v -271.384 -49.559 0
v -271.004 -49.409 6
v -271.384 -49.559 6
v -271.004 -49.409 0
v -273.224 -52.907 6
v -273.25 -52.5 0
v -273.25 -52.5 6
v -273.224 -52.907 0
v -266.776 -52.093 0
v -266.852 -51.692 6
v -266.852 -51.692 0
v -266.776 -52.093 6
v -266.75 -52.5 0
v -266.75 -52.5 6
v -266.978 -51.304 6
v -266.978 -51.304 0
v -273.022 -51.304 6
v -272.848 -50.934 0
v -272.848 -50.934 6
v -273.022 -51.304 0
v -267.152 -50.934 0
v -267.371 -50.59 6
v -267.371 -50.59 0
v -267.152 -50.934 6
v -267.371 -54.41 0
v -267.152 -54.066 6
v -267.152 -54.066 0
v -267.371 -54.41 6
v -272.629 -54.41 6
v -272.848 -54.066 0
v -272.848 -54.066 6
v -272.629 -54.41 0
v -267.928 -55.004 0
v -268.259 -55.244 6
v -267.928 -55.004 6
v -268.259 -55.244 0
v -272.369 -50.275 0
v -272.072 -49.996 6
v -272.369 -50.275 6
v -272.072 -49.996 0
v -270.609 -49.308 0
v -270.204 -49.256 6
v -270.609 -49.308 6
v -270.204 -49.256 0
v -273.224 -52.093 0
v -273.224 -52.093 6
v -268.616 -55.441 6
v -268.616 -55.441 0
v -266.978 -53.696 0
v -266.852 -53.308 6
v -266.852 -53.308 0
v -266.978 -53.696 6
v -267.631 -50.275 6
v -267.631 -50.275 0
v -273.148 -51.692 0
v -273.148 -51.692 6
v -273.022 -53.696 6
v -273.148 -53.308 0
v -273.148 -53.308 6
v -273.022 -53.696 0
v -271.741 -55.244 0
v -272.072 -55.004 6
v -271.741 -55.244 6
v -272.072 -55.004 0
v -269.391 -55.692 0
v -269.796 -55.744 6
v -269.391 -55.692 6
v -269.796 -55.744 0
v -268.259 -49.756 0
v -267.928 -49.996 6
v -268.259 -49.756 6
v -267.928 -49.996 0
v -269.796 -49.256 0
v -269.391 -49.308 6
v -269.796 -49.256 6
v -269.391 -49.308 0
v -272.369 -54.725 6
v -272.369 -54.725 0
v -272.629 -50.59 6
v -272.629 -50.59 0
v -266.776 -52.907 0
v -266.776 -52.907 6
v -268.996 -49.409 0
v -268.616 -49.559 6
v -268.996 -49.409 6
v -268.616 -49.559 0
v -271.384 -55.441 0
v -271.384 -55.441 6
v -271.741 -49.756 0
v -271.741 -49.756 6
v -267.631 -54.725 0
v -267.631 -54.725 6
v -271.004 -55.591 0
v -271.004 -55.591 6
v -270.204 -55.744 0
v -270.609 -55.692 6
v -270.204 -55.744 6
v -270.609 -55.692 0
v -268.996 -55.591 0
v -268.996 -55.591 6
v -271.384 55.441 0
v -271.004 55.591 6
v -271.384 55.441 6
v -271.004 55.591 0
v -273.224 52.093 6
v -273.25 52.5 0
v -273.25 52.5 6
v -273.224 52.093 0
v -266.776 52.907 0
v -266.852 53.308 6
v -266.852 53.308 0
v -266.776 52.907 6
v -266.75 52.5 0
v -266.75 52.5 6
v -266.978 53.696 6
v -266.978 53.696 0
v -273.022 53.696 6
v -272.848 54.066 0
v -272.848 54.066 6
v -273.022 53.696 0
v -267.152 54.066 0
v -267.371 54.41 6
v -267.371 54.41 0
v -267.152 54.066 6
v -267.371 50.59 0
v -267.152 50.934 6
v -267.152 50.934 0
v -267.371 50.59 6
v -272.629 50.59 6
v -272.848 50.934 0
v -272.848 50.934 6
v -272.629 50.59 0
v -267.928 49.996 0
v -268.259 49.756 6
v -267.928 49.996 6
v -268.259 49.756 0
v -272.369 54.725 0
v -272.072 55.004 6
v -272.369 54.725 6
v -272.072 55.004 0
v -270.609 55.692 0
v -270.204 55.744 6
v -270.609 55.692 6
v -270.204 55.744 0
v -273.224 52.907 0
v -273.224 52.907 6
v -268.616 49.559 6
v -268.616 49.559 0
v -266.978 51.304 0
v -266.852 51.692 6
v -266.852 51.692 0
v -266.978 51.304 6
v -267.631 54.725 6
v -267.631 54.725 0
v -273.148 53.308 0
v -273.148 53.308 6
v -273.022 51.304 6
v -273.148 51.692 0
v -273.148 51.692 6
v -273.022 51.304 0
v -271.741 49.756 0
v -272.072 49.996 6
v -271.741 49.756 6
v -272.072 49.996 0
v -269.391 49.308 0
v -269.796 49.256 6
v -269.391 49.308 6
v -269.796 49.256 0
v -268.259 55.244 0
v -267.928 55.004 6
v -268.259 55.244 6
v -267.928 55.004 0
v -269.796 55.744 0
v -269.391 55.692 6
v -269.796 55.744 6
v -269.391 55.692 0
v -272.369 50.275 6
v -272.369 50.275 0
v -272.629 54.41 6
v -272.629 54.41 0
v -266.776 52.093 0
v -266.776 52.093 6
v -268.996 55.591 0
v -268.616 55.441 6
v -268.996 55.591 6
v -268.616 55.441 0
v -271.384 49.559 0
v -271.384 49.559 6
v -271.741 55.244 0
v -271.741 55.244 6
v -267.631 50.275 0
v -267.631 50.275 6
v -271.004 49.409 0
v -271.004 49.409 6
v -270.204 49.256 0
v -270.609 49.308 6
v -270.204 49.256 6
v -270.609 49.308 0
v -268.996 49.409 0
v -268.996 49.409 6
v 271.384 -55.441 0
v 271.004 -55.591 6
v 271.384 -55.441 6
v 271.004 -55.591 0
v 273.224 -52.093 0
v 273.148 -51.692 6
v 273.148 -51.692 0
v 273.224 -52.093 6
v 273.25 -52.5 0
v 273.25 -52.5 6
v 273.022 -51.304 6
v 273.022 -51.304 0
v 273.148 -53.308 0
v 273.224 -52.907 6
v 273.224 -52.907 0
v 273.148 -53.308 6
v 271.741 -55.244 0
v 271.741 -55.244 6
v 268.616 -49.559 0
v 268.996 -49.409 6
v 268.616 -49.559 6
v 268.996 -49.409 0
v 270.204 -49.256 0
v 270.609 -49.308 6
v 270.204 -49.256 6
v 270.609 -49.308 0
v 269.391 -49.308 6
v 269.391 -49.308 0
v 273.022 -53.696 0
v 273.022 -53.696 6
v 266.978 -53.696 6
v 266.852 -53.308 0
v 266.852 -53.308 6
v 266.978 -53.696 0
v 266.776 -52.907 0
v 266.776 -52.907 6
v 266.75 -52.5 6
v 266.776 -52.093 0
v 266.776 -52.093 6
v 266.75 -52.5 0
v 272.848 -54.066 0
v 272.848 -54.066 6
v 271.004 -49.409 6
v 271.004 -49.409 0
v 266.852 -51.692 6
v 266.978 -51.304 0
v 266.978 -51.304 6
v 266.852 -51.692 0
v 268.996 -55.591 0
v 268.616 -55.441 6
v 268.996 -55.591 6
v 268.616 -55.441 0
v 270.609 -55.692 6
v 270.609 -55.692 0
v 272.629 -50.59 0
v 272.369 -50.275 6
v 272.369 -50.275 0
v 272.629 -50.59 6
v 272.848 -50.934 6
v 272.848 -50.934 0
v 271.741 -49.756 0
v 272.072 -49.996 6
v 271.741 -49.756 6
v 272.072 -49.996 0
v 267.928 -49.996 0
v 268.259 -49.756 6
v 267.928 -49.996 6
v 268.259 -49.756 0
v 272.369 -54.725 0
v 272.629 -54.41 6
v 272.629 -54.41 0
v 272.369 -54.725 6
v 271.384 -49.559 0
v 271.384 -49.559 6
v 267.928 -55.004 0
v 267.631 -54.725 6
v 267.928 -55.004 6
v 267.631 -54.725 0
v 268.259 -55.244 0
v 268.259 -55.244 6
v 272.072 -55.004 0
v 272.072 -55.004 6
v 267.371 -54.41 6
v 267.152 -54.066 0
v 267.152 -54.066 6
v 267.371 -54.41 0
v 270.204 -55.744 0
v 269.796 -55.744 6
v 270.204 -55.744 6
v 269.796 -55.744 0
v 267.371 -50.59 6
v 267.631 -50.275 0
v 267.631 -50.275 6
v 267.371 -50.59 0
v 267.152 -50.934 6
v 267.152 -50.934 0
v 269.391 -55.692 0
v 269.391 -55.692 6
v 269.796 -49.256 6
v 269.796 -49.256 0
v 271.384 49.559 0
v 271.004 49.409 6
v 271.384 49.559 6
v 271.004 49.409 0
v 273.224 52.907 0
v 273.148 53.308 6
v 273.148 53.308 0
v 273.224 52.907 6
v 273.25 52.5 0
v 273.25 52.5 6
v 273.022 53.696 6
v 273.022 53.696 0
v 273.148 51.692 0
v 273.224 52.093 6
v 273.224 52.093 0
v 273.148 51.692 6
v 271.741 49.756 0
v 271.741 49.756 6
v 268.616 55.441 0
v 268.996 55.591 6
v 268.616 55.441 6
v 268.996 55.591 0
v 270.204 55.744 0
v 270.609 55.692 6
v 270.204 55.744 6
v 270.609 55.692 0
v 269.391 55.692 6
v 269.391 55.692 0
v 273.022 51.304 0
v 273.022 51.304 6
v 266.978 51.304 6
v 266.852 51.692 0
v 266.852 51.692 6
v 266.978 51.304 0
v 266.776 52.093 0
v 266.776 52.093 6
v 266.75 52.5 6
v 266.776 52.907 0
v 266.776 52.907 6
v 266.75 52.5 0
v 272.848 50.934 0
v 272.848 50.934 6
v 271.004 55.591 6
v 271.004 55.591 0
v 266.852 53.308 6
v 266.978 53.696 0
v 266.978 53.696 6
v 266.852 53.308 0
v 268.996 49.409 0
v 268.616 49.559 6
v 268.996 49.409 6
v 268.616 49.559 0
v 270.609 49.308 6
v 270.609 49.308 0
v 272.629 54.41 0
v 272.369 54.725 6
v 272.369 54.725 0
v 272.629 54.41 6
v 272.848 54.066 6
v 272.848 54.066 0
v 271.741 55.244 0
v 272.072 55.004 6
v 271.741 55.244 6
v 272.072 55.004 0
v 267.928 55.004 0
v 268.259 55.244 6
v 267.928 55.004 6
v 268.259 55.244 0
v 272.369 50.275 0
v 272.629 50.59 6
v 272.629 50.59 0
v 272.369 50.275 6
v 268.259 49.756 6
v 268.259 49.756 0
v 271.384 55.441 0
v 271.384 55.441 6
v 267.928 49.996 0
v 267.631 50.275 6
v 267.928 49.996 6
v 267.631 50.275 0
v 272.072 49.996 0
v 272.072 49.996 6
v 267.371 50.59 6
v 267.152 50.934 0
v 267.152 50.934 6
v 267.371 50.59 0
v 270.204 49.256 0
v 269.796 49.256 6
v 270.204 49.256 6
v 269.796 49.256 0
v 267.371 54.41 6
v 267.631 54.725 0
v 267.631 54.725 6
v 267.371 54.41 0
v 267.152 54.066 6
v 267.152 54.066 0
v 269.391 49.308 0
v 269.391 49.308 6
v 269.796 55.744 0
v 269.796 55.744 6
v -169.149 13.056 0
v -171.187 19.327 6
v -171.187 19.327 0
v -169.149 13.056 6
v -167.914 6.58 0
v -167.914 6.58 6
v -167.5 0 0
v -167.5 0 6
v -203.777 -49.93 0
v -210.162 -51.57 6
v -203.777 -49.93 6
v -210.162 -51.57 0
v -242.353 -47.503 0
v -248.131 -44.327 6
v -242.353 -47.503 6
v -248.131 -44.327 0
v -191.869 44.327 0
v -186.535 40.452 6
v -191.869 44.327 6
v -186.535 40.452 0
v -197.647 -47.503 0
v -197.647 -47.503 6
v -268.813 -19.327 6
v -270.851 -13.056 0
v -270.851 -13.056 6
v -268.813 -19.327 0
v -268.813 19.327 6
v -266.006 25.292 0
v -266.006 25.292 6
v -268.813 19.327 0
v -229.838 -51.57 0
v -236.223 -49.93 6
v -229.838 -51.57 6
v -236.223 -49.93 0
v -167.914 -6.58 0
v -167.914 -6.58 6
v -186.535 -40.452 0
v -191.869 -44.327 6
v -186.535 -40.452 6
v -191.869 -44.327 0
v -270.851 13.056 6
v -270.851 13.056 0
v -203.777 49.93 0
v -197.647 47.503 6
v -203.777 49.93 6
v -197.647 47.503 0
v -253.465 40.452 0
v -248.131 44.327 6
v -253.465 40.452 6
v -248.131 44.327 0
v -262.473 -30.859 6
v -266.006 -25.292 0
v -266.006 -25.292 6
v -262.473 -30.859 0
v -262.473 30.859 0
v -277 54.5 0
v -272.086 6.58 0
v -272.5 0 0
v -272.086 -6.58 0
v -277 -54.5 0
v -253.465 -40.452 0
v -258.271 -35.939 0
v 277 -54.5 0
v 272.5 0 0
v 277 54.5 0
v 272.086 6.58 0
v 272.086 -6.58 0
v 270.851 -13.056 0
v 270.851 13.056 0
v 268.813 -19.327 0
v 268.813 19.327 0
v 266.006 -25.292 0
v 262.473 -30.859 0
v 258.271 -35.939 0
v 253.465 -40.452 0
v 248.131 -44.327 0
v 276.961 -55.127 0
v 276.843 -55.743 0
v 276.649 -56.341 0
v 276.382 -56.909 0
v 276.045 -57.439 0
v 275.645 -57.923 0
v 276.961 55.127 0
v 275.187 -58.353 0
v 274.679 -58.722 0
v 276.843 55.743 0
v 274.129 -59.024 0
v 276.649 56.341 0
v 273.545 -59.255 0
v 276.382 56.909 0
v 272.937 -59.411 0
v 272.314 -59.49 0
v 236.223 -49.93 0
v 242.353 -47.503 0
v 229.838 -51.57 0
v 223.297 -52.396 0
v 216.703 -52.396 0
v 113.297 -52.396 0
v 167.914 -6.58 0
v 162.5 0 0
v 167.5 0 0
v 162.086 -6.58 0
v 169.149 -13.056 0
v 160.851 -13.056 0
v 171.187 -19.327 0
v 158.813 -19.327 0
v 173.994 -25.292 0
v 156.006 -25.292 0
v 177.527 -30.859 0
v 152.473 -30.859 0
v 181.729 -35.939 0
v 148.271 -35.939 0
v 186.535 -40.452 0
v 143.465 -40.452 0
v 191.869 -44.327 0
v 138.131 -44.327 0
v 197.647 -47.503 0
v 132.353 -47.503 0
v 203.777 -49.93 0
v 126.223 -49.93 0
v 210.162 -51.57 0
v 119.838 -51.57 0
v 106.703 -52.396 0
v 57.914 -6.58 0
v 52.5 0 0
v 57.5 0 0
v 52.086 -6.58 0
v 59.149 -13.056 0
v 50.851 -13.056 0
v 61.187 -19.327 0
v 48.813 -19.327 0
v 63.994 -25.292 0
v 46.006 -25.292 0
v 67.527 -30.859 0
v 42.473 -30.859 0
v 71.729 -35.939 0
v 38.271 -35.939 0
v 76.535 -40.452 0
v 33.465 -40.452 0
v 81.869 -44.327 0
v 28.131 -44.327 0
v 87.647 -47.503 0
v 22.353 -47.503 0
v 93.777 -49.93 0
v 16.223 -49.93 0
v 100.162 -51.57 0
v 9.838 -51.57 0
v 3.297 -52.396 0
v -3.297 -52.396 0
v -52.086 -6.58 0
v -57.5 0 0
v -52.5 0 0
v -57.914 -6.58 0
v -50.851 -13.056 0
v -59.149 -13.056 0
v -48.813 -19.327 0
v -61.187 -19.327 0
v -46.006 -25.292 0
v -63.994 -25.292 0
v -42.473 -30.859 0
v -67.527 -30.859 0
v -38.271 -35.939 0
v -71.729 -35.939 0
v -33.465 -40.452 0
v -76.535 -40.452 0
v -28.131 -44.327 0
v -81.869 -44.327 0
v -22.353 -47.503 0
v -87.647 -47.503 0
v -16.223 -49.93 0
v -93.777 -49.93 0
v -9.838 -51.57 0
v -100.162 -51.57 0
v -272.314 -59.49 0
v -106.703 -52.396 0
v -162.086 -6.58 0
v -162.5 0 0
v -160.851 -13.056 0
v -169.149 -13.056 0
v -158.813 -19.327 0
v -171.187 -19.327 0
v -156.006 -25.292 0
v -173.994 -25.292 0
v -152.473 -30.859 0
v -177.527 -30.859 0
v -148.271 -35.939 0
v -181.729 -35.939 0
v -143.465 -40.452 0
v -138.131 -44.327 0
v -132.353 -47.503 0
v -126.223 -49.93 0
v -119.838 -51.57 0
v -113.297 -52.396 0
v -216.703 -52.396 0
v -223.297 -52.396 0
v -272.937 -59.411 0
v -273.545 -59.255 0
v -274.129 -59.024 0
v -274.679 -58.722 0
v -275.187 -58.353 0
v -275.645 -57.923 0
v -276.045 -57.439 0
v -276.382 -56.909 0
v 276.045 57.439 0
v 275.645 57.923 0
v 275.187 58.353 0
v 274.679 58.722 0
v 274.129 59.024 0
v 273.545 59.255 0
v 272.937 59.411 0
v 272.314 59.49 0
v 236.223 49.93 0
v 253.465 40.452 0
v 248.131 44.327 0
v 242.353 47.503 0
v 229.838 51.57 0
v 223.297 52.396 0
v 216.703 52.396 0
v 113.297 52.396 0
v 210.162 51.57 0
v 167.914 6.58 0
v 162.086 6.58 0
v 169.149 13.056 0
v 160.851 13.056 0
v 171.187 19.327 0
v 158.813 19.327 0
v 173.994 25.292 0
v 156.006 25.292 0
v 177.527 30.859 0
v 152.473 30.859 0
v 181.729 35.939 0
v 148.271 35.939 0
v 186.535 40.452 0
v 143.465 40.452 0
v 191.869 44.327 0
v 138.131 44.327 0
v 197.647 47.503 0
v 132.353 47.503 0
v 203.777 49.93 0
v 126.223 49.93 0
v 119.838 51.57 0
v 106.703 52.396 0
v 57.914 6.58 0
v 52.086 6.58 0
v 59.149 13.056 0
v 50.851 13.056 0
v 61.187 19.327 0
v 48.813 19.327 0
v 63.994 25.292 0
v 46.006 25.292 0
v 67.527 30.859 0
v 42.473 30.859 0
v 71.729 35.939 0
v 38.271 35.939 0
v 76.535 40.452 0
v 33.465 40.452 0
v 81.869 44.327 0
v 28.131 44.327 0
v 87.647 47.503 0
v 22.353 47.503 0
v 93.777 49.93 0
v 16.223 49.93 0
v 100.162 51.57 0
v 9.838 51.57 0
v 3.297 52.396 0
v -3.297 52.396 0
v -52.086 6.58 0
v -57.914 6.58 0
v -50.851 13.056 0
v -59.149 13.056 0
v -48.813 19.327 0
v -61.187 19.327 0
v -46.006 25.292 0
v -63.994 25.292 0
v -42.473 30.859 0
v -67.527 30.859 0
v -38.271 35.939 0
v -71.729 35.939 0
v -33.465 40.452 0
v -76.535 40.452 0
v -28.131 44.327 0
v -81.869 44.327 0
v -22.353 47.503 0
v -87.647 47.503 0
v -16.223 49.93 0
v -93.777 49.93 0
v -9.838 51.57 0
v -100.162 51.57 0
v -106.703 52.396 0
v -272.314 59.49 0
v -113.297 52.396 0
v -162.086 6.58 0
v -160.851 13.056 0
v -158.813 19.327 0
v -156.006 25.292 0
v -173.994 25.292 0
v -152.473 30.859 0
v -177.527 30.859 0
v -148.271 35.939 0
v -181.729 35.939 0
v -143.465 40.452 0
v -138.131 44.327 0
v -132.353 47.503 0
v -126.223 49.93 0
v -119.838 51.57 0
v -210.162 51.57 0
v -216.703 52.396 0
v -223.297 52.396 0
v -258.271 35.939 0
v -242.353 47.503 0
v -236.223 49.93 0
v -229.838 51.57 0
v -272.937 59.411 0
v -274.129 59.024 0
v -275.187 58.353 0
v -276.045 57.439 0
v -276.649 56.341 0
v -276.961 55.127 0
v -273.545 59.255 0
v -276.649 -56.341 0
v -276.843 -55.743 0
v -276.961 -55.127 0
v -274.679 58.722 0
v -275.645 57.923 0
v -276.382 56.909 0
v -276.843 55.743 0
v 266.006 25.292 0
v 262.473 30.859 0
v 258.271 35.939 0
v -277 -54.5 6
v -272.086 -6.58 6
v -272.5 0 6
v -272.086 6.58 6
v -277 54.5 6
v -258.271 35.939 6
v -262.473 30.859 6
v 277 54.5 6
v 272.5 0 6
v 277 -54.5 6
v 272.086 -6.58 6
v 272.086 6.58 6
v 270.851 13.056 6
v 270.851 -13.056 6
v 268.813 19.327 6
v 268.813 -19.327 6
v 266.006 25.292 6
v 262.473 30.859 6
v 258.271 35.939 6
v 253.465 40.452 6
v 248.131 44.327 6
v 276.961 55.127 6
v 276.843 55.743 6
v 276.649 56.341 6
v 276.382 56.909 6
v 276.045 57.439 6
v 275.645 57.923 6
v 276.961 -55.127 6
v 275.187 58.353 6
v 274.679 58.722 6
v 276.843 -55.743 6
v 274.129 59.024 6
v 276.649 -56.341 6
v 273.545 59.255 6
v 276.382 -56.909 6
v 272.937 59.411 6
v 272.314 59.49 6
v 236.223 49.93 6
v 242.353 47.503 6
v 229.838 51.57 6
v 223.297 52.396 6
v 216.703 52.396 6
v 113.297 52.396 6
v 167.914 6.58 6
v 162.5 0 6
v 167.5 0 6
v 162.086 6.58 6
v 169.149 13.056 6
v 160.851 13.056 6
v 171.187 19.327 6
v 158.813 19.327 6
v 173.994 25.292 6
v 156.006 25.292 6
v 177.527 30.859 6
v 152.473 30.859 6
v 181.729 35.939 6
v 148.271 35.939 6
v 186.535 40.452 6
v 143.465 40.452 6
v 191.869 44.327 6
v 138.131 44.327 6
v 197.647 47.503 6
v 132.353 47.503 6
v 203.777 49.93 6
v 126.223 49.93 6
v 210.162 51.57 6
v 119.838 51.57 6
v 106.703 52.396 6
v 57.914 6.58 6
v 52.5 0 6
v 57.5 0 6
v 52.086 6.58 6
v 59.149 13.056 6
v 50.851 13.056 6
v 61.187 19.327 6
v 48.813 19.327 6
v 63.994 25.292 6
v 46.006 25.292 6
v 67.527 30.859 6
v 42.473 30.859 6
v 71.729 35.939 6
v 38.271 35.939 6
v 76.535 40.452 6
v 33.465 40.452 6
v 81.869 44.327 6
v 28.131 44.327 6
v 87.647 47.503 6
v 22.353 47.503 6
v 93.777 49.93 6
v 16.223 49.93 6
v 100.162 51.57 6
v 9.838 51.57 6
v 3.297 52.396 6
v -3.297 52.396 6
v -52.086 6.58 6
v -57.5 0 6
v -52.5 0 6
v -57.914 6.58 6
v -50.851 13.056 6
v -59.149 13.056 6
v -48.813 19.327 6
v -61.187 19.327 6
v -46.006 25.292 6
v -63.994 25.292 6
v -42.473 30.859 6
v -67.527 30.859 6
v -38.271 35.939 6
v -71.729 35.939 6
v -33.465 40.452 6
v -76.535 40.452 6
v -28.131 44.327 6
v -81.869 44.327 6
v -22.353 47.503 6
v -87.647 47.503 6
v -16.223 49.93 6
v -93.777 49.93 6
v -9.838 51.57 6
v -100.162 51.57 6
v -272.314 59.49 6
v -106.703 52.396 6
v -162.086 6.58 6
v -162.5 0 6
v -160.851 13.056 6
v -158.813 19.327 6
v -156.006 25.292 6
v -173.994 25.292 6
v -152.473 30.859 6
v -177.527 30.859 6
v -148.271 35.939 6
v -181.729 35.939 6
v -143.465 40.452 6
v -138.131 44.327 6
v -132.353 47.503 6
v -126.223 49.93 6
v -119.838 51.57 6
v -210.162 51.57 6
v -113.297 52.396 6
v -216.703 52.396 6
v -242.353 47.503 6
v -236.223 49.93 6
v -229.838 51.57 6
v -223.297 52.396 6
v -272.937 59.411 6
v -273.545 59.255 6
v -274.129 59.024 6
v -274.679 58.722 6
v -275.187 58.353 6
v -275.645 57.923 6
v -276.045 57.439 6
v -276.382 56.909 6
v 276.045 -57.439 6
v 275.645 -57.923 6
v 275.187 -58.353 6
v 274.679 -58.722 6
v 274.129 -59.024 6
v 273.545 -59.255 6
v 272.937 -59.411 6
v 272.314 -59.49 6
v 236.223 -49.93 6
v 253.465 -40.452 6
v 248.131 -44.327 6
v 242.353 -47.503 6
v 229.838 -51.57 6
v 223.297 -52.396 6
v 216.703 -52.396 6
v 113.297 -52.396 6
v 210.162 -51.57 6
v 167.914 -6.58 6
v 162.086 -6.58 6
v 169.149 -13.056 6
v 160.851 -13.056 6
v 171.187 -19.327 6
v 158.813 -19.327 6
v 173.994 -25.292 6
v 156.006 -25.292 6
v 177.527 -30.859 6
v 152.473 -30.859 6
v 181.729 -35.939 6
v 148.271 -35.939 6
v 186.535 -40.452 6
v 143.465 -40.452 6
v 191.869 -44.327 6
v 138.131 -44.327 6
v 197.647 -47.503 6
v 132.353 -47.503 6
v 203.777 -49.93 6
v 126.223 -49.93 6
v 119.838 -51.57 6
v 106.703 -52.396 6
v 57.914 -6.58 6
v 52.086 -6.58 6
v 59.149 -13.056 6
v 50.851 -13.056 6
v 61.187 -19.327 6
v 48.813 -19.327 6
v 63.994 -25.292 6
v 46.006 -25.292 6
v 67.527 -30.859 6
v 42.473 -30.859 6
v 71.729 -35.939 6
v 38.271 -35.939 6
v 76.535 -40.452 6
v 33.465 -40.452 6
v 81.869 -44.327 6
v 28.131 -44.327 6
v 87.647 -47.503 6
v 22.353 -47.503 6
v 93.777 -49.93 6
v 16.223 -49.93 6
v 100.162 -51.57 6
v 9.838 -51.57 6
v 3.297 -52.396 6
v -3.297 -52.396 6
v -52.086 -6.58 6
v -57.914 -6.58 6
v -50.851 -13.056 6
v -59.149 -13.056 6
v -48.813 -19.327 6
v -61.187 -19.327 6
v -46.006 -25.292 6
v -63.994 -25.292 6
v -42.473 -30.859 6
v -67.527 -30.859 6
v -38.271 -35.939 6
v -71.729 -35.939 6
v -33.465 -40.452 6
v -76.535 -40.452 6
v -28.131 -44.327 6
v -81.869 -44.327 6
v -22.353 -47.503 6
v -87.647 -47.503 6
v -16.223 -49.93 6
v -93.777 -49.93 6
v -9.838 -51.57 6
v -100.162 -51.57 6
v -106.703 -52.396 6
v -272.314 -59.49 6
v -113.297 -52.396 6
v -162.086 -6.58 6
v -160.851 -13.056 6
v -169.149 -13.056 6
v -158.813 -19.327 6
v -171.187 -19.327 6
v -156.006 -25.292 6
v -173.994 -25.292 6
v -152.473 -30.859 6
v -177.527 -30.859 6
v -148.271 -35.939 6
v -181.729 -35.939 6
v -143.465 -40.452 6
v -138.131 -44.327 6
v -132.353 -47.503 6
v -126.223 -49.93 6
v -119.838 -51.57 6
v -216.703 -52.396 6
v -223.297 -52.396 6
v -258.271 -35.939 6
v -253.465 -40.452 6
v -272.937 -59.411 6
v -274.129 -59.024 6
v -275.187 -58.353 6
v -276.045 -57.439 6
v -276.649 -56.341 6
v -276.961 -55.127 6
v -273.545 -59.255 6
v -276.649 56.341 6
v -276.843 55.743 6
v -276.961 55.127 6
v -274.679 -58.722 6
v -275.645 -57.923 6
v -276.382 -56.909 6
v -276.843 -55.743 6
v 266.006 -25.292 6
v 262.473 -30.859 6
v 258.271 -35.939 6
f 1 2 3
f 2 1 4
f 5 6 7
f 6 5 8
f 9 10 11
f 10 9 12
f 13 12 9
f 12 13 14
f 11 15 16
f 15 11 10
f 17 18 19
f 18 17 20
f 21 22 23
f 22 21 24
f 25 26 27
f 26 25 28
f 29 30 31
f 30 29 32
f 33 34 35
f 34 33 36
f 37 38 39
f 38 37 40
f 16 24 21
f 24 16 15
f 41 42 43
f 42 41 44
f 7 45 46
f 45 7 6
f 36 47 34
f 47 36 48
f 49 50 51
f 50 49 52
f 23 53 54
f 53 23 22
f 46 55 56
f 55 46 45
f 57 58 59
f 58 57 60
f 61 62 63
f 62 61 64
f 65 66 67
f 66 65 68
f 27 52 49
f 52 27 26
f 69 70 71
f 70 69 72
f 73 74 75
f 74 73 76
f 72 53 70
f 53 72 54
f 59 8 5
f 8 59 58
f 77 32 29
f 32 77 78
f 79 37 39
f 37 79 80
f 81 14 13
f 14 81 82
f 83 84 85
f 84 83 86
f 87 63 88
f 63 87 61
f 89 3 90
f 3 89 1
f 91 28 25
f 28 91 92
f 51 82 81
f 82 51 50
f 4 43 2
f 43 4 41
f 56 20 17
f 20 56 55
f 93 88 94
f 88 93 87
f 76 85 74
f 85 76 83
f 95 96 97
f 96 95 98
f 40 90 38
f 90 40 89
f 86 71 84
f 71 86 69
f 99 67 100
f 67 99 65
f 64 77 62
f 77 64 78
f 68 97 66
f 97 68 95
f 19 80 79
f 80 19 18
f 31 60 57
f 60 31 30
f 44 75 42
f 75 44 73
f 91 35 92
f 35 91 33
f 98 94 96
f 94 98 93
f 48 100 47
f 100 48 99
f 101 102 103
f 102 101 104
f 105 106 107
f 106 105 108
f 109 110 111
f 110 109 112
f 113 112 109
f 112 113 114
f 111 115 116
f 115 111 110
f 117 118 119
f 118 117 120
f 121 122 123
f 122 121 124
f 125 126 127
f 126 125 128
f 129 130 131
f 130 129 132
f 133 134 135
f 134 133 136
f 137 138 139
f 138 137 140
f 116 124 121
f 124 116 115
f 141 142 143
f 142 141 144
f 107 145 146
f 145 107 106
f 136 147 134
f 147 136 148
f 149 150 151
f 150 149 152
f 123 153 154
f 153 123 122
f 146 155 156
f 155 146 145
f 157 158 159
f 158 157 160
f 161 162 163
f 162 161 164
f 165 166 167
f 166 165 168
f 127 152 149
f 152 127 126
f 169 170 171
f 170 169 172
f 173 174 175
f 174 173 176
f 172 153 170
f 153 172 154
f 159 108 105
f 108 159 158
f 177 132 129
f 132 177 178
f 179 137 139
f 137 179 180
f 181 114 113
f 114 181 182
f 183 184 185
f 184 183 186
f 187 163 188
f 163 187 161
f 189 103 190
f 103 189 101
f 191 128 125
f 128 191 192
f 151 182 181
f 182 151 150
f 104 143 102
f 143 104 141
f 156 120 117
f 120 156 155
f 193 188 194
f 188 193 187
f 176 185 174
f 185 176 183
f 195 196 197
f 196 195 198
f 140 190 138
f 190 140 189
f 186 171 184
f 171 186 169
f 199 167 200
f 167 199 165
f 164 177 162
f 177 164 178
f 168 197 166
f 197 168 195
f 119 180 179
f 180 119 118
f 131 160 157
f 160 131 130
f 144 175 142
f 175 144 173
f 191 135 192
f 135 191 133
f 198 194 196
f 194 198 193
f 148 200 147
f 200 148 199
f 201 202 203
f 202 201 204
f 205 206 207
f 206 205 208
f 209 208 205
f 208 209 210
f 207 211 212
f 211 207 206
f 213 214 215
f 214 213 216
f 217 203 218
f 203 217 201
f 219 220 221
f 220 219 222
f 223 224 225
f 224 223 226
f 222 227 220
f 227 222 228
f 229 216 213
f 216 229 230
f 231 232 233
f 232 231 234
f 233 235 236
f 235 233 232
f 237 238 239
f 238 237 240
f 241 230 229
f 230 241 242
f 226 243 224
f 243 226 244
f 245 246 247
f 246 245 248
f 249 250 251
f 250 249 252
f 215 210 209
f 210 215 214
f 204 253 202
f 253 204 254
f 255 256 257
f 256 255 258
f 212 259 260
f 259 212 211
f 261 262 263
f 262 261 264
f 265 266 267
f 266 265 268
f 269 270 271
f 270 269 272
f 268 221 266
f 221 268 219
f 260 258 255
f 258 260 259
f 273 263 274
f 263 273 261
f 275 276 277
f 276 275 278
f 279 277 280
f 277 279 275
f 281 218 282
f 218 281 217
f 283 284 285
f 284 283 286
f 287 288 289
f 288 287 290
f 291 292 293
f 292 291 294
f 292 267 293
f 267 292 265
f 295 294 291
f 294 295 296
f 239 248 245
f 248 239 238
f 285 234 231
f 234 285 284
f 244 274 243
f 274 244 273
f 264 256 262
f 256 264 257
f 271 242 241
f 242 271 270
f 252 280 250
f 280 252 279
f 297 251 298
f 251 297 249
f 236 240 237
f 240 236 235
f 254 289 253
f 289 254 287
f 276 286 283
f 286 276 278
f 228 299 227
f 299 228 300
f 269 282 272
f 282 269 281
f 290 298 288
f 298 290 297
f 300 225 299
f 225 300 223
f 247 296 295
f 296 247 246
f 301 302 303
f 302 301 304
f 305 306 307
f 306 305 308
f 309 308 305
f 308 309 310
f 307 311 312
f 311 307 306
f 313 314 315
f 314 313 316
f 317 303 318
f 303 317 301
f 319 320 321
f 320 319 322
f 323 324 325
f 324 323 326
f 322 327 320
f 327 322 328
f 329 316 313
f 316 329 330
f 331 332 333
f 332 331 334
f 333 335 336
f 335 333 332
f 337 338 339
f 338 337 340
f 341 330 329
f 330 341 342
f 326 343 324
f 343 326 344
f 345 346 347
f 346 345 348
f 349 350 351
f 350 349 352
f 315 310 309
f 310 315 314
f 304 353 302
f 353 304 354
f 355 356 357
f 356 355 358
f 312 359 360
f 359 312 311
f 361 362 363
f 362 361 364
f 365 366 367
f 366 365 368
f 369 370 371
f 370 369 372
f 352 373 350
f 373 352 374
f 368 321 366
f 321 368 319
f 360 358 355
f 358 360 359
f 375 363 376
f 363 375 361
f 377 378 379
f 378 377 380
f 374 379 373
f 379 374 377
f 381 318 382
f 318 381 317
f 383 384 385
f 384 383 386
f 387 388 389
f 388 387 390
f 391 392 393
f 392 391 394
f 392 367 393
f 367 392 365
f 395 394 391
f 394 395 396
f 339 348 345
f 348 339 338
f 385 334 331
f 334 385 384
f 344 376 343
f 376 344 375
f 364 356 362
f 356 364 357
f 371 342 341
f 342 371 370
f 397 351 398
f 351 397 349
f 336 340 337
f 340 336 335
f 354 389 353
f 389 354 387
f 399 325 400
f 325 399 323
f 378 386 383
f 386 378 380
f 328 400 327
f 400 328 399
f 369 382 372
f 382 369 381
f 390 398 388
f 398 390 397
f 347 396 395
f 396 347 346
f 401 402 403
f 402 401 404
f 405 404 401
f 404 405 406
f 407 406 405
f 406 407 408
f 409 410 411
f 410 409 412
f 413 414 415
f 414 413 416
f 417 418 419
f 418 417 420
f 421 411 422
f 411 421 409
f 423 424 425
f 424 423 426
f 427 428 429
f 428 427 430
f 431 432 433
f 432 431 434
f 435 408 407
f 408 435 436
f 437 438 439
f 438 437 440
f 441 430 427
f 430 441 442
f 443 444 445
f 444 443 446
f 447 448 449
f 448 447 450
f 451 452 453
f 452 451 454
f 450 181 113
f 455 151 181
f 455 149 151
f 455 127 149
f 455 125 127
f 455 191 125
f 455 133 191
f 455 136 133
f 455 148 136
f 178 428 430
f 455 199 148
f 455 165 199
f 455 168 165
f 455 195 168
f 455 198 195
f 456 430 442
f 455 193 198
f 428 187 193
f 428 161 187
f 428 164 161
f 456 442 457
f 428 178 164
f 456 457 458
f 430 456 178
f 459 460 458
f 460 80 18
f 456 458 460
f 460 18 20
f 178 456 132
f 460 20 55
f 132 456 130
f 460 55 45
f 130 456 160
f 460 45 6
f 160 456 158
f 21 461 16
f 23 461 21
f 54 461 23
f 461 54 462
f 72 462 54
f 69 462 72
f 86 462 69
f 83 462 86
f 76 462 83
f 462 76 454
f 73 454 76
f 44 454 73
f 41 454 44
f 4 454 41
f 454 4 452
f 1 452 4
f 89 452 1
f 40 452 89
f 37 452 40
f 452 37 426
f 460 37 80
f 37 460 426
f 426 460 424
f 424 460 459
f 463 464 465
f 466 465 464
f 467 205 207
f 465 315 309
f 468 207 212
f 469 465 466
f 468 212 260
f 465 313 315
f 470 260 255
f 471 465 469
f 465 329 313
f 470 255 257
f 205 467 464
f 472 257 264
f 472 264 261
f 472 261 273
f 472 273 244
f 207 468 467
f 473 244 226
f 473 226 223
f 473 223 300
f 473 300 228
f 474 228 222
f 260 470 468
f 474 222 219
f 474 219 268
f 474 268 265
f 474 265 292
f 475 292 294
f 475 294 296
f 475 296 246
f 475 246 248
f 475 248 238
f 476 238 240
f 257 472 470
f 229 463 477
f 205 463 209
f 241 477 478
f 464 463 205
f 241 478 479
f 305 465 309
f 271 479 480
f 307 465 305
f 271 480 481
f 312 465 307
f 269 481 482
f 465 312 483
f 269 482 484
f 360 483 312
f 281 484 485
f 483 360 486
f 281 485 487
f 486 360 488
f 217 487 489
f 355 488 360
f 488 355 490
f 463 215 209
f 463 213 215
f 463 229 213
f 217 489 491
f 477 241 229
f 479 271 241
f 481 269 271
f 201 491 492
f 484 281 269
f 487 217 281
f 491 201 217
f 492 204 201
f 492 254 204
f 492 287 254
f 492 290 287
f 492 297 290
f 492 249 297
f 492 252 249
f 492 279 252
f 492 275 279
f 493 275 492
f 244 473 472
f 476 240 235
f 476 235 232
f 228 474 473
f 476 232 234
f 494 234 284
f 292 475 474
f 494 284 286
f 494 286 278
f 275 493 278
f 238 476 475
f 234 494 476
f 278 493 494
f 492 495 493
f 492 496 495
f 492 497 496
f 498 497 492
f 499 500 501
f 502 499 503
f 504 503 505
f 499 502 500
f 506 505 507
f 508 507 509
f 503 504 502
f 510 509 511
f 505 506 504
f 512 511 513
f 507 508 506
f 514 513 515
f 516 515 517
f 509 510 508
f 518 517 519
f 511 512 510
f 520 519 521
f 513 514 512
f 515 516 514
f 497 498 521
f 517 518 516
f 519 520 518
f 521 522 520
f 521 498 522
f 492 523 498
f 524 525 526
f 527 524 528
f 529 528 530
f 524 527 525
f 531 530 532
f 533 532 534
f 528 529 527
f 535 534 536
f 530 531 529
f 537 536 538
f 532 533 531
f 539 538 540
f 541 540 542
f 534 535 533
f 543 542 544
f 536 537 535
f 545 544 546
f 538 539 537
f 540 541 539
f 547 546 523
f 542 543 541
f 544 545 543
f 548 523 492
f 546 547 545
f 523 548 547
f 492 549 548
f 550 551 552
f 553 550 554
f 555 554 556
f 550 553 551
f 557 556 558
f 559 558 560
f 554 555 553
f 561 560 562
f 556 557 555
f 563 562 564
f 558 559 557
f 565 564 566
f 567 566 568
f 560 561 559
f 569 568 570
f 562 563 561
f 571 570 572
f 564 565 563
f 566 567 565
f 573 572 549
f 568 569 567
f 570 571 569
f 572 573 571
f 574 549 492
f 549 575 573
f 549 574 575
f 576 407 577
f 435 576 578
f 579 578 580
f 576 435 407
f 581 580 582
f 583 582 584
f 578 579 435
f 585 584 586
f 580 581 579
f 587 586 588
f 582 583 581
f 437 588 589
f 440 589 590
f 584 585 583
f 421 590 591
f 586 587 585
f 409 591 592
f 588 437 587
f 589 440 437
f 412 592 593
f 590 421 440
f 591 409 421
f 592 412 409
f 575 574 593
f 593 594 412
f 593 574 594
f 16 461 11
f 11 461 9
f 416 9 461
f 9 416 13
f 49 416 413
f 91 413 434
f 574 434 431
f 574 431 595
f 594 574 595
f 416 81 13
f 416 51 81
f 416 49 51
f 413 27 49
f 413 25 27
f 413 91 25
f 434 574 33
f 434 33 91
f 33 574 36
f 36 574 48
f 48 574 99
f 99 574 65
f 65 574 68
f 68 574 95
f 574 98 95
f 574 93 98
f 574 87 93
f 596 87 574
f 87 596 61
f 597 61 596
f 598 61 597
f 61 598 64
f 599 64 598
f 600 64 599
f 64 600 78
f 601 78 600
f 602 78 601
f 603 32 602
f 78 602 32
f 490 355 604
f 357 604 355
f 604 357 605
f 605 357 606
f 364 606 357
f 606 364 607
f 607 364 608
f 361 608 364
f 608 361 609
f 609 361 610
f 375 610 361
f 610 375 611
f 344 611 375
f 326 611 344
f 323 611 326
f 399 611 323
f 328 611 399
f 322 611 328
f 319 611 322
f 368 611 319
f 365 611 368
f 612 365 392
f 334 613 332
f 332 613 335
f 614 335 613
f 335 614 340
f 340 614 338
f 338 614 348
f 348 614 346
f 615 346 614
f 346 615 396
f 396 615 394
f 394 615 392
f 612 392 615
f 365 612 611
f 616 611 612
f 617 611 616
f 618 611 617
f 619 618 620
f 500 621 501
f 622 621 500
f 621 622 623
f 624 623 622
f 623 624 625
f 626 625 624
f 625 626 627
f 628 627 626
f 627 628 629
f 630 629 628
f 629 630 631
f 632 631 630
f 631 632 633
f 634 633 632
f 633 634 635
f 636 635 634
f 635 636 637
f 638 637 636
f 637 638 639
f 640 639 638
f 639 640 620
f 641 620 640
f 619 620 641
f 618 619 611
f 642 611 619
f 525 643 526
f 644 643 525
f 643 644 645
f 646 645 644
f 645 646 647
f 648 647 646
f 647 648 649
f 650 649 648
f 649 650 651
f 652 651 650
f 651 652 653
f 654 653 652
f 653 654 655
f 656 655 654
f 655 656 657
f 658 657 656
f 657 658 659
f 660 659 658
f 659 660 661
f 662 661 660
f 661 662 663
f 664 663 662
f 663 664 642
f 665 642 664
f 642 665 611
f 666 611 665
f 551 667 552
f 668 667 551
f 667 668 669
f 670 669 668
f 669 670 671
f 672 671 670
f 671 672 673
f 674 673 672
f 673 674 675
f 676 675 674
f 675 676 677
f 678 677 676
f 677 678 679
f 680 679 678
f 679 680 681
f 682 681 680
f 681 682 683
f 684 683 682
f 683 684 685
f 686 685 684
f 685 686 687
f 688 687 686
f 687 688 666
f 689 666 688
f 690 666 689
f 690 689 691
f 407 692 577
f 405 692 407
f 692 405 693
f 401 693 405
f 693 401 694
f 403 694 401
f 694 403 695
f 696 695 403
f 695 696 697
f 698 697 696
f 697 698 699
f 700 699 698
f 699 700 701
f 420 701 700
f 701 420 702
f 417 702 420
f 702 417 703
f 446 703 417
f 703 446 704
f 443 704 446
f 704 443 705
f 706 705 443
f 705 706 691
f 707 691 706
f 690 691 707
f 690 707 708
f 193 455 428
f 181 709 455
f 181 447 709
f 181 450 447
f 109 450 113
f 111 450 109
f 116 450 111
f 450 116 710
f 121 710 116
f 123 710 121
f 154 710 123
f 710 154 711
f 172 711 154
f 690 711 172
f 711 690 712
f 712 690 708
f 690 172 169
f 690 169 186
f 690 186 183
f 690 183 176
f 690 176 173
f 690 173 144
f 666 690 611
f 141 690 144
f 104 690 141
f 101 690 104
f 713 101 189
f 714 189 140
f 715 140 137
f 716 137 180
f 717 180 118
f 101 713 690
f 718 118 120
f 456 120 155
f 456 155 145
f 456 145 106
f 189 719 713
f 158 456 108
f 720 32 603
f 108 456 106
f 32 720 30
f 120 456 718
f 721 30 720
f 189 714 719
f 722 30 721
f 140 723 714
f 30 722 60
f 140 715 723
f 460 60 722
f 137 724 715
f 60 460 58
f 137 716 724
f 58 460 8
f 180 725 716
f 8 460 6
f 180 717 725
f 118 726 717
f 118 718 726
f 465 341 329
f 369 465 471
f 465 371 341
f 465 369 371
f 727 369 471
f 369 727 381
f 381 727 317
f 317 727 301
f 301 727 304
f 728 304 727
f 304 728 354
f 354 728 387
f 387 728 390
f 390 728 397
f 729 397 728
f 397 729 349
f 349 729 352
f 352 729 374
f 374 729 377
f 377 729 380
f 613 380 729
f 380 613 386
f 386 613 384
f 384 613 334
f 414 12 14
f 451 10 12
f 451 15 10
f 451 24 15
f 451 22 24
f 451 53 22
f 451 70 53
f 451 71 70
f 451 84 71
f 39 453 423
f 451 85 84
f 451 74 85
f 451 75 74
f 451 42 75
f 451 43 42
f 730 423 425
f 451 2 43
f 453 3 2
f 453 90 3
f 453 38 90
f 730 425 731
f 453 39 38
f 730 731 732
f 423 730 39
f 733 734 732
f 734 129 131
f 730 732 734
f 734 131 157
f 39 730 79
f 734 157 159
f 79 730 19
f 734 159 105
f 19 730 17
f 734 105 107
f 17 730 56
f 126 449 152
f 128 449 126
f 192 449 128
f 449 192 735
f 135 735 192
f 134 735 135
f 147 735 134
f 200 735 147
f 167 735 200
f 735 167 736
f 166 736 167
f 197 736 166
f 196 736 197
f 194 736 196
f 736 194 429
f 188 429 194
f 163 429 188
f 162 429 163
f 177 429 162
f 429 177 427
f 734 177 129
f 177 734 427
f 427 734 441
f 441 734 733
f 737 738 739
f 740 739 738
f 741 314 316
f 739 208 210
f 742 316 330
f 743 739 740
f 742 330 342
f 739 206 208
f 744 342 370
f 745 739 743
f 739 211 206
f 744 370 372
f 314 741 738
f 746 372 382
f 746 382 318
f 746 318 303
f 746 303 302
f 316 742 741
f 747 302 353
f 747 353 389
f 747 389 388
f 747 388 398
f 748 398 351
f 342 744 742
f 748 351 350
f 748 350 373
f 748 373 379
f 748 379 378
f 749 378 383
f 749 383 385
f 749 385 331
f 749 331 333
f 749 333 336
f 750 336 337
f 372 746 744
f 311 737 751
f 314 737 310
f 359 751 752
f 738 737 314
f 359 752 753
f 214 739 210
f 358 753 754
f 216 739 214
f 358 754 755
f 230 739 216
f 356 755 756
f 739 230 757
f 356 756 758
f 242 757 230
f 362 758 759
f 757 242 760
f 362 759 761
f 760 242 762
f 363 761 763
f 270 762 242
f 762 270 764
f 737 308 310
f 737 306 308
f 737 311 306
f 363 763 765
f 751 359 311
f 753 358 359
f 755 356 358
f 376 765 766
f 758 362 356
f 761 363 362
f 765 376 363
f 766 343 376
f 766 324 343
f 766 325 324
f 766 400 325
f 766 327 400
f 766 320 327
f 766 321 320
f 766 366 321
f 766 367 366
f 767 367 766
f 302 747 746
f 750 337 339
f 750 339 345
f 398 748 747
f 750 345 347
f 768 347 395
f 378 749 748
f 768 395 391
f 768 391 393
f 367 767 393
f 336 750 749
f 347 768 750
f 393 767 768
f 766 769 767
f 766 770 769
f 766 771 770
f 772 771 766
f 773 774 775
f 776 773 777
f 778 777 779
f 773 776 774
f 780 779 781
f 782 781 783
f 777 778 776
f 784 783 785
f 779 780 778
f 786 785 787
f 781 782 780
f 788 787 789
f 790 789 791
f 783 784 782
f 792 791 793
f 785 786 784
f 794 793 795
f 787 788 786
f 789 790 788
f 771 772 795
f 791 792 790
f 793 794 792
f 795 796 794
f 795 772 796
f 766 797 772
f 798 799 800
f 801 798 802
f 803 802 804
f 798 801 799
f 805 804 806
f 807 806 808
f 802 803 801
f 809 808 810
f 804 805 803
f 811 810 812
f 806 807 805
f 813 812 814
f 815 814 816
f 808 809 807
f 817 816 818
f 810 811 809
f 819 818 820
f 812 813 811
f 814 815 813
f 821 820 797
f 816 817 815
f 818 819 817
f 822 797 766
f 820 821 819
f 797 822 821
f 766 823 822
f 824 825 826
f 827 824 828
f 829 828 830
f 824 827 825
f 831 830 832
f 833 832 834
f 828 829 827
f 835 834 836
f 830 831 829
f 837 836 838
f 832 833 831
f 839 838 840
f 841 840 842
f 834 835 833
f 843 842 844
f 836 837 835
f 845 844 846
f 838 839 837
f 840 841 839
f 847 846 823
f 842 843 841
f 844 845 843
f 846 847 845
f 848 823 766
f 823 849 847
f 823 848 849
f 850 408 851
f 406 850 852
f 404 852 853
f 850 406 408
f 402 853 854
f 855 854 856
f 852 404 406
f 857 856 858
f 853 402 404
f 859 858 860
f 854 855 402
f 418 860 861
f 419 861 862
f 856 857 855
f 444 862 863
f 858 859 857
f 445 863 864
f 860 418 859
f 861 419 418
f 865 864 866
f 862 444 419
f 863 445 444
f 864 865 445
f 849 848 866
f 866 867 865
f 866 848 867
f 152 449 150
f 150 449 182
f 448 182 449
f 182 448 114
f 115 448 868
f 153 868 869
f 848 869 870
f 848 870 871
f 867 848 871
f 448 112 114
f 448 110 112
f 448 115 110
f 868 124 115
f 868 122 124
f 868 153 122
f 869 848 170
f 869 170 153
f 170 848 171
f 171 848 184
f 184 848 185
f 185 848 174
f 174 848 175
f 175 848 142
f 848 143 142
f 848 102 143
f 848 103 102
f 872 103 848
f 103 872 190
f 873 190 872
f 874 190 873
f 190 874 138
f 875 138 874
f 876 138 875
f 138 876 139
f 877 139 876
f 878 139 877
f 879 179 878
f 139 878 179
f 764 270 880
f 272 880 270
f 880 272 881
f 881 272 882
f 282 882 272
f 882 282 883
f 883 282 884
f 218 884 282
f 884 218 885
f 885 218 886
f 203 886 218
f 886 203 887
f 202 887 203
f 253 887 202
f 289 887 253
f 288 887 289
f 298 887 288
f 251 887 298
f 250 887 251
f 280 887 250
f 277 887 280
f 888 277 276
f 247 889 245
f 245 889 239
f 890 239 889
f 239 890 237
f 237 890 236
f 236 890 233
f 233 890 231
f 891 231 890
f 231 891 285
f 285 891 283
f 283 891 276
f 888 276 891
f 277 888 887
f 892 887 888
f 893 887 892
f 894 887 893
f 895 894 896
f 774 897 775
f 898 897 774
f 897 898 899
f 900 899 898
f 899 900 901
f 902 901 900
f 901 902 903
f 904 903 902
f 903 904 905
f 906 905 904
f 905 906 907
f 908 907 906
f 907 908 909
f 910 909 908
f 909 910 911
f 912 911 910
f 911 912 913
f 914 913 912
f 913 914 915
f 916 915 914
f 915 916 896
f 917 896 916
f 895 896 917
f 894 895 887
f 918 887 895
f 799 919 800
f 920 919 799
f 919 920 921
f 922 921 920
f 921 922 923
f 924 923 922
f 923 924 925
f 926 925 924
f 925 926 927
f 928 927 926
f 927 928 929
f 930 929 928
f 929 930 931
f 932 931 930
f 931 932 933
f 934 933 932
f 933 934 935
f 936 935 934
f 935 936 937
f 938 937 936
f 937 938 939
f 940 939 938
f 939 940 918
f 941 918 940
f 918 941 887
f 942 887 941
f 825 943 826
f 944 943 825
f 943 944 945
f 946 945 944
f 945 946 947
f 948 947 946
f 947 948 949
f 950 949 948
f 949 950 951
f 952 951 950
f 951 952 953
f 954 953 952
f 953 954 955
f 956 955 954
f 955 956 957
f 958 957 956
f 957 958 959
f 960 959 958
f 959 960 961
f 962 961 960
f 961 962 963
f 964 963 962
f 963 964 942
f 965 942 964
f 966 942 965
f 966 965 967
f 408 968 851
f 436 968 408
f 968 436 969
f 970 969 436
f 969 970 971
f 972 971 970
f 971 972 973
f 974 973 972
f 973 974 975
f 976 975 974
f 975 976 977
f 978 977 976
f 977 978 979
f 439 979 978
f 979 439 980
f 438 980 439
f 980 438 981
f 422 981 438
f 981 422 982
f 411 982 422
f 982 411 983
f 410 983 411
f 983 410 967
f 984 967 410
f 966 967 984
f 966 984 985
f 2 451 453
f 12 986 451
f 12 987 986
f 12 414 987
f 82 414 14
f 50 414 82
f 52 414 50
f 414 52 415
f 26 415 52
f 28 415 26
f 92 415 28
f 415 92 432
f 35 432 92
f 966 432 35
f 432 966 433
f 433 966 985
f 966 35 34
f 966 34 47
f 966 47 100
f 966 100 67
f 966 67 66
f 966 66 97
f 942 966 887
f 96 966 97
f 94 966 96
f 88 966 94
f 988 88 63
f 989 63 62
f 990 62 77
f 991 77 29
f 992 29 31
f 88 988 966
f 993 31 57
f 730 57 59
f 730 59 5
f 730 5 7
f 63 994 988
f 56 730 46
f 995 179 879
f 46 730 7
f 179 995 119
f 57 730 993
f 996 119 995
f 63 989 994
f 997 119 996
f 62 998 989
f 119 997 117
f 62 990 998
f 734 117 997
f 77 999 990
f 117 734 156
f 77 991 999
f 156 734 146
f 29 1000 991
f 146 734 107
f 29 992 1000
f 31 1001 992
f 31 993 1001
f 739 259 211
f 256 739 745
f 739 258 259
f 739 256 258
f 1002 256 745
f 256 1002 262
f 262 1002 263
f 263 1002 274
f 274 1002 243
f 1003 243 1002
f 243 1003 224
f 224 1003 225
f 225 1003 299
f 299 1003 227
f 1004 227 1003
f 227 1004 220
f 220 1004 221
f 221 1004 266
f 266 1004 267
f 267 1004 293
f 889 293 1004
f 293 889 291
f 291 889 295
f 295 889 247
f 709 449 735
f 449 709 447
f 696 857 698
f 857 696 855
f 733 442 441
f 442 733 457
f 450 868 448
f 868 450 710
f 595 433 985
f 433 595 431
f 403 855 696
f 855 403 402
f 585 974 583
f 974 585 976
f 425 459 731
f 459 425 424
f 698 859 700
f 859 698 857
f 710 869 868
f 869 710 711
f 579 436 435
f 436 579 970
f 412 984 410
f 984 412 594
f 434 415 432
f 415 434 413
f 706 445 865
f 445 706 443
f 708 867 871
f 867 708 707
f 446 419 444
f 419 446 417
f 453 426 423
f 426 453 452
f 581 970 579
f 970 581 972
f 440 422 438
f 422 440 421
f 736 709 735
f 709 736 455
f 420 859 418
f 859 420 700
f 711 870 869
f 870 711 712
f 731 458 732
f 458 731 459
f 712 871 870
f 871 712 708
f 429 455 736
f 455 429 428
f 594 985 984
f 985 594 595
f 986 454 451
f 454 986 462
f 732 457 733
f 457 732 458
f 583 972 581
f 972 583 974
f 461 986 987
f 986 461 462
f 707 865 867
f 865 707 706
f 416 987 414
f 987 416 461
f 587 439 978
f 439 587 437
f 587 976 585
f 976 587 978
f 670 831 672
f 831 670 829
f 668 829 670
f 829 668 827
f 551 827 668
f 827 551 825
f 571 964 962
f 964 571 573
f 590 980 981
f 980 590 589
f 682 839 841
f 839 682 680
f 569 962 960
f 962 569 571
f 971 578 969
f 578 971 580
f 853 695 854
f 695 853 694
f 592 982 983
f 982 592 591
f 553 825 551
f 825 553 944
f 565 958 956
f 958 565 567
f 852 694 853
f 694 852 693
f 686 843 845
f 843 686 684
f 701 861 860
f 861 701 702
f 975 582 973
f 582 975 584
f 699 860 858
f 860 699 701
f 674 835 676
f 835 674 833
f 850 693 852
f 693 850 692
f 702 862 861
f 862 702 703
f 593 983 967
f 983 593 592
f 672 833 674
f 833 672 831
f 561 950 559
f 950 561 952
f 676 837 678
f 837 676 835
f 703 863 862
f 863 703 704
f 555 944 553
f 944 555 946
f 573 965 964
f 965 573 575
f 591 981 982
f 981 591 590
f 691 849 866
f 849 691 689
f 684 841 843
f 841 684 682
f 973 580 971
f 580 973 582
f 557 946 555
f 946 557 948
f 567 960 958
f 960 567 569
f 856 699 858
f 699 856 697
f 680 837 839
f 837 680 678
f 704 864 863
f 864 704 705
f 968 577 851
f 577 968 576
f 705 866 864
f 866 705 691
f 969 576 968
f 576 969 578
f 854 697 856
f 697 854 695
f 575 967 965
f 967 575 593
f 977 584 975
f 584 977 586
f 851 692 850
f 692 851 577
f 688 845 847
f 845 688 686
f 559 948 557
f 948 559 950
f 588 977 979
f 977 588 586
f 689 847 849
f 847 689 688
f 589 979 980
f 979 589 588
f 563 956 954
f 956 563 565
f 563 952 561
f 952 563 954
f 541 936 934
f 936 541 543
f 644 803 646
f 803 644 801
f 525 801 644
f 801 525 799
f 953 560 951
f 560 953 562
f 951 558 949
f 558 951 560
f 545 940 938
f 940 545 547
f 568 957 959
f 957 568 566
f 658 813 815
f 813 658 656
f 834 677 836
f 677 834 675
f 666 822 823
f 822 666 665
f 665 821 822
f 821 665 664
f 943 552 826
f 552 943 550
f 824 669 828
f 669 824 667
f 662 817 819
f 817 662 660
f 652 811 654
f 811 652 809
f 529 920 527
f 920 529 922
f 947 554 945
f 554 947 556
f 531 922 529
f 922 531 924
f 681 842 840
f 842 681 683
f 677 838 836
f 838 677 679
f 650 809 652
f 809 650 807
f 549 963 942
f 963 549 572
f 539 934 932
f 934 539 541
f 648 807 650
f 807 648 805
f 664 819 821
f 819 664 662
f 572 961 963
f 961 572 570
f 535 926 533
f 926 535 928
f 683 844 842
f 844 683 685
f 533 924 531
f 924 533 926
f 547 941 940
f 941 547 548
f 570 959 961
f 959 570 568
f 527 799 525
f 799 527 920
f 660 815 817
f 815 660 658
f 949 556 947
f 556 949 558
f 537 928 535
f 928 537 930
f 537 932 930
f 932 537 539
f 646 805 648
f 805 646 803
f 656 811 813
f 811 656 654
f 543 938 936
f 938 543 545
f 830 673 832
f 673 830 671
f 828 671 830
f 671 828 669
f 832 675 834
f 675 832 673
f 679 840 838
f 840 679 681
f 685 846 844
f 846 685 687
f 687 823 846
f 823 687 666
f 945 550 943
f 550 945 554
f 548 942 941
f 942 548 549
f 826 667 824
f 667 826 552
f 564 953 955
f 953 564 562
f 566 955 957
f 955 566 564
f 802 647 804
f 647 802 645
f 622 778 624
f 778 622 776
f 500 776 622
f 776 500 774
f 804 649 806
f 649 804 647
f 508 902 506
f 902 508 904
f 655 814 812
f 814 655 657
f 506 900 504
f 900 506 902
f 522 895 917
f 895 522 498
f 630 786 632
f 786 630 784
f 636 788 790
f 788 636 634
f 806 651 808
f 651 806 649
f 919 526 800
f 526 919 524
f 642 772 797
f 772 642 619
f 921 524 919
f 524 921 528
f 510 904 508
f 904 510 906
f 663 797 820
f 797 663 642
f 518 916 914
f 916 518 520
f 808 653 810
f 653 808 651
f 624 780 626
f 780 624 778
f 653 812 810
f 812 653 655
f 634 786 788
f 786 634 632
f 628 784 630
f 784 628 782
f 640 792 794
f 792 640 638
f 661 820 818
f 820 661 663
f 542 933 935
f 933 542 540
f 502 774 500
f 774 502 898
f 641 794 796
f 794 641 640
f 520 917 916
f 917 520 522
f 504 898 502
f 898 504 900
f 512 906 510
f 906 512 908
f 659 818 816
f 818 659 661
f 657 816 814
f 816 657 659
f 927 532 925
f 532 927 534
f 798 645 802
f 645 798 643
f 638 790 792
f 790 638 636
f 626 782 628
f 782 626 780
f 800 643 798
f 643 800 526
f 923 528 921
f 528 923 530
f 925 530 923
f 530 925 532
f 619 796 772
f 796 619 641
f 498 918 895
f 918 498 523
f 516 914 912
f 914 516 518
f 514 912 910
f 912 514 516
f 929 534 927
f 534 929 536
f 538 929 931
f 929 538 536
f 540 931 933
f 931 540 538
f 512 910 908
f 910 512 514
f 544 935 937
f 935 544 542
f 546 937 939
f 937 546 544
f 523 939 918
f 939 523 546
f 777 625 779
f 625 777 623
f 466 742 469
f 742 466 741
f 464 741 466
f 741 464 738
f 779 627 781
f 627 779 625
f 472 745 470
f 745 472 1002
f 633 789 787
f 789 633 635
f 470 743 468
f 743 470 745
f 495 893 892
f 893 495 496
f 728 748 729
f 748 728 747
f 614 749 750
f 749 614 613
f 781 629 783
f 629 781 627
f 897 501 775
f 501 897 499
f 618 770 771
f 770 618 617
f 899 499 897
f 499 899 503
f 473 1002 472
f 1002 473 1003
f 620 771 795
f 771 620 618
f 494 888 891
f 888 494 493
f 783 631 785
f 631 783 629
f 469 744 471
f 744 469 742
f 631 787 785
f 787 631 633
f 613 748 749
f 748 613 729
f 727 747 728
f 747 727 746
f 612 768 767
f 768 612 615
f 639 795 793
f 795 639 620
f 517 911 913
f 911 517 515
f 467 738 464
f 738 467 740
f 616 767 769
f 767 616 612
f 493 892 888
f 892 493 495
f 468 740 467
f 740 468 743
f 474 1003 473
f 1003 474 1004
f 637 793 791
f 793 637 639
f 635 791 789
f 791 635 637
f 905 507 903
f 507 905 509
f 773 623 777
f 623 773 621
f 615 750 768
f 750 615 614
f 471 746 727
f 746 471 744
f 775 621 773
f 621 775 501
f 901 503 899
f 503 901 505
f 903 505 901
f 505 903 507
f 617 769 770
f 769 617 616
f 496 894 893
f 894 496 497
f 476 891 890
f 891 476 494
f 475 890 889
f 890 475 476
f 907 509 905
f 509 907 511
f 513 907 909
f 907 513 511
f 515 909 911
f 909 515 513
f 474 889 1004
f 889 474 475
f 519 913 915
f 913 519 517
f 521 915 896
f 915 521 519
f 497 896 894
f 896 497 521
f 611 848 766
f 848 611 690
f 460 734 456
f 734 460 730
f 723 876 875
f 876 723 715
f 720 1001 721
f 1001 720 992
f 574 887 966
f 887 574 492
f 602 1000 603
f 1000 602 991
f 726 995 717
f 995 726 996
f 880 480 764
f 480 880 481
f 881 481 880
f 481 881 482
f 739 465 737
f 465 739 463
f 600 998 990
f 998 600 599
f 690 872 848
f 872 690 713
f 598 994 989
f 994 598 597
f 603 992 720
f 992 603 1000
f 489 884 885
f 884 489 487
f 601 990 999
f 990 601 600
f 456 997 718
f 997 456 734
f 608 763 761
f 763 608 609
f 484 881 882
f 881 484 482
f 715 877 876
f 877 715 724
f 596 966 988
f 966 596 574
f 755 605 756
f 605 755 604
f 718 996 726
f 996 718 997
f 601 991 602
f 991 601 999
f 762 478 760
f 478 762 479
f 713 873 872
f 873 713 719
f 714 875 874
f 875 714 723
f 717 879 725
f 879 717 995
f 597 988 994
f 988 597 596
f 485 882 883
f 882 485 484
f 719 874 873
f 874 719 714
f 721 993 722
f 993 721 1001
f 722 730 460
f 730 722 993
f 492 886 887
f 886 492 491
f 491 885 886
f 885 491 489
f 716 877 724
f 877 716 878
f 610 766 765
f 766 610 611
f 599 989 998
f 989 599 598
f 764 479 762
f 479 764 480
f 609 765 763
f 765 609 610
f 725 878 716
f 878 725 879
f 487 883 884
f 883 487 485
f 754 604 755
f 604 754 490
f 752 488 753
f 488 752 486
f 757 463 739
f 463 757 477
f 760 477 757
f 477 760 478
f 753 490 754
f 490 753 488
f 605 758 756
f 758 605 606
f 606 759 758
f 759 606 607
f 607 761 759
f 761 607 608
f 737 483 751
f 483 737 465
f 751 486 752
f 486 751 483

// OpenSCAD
$fn = 50;


difference() {
	union() {
		hull() {
			translate(v = [-272.0000000000, 54.5000000000, 0]) {
				cylinder(h = 6, r = 5);
			}
			translate(v = [272.0000000000, 54.5000000000, 0]) {
				cylinder(h = 6, r = 5);
			}
			translate(v = [-272.0000000000, -54.5000000000, 0]) {
				cylinder(h = 6, r = 5);
			}
			translate(v = [272.0000000000, -54.5000000000, 0]) {
				cylinder(h = 6, r = 5);
			}
		}
	}
	union() {
		#translate(v = [-270.0000000000, -52.5000000000, -100.0000000000]) {
			cylinder(h = 200, r = 3.2500000000);
		}
		#translate(v = [-270.0000000000, 52.5000000000, -100.0000000000]) {
			cylinder(h = 200, r = 3.2500000000);
		}
		#translate(v = [270.0000000000, -52.5000000000, -100.0000000000]) {
			cylinder(h = 200, r = 3.2500000000);
		}
		#translate(v = [270.0000000000, 52.5000000000, -100.0000000000]) {
			cylinder(h = 200, r = 3.2500000000);
		}
		#translate(v = [-220.0000000000, 0, 0]) {
			cylinder(h = 6, r = 52.5000000000);
		}
		#translate(v = [-110.0000000000, 0, 0]) {
			cylinder(h = 6, r = 52.5000000000);
		}
		#cylinder(h = 6, r = 52.5000000000);
		#translate(v = [110.0000000000, 0, 0]) {
			cylinder(h = 6, r = 52.5000000000);
		}
		#translate(v = [220.0000000000, 0, 0]) {
			cylinder(h = 6, r = 52.5000000000);
		}
	}
}
